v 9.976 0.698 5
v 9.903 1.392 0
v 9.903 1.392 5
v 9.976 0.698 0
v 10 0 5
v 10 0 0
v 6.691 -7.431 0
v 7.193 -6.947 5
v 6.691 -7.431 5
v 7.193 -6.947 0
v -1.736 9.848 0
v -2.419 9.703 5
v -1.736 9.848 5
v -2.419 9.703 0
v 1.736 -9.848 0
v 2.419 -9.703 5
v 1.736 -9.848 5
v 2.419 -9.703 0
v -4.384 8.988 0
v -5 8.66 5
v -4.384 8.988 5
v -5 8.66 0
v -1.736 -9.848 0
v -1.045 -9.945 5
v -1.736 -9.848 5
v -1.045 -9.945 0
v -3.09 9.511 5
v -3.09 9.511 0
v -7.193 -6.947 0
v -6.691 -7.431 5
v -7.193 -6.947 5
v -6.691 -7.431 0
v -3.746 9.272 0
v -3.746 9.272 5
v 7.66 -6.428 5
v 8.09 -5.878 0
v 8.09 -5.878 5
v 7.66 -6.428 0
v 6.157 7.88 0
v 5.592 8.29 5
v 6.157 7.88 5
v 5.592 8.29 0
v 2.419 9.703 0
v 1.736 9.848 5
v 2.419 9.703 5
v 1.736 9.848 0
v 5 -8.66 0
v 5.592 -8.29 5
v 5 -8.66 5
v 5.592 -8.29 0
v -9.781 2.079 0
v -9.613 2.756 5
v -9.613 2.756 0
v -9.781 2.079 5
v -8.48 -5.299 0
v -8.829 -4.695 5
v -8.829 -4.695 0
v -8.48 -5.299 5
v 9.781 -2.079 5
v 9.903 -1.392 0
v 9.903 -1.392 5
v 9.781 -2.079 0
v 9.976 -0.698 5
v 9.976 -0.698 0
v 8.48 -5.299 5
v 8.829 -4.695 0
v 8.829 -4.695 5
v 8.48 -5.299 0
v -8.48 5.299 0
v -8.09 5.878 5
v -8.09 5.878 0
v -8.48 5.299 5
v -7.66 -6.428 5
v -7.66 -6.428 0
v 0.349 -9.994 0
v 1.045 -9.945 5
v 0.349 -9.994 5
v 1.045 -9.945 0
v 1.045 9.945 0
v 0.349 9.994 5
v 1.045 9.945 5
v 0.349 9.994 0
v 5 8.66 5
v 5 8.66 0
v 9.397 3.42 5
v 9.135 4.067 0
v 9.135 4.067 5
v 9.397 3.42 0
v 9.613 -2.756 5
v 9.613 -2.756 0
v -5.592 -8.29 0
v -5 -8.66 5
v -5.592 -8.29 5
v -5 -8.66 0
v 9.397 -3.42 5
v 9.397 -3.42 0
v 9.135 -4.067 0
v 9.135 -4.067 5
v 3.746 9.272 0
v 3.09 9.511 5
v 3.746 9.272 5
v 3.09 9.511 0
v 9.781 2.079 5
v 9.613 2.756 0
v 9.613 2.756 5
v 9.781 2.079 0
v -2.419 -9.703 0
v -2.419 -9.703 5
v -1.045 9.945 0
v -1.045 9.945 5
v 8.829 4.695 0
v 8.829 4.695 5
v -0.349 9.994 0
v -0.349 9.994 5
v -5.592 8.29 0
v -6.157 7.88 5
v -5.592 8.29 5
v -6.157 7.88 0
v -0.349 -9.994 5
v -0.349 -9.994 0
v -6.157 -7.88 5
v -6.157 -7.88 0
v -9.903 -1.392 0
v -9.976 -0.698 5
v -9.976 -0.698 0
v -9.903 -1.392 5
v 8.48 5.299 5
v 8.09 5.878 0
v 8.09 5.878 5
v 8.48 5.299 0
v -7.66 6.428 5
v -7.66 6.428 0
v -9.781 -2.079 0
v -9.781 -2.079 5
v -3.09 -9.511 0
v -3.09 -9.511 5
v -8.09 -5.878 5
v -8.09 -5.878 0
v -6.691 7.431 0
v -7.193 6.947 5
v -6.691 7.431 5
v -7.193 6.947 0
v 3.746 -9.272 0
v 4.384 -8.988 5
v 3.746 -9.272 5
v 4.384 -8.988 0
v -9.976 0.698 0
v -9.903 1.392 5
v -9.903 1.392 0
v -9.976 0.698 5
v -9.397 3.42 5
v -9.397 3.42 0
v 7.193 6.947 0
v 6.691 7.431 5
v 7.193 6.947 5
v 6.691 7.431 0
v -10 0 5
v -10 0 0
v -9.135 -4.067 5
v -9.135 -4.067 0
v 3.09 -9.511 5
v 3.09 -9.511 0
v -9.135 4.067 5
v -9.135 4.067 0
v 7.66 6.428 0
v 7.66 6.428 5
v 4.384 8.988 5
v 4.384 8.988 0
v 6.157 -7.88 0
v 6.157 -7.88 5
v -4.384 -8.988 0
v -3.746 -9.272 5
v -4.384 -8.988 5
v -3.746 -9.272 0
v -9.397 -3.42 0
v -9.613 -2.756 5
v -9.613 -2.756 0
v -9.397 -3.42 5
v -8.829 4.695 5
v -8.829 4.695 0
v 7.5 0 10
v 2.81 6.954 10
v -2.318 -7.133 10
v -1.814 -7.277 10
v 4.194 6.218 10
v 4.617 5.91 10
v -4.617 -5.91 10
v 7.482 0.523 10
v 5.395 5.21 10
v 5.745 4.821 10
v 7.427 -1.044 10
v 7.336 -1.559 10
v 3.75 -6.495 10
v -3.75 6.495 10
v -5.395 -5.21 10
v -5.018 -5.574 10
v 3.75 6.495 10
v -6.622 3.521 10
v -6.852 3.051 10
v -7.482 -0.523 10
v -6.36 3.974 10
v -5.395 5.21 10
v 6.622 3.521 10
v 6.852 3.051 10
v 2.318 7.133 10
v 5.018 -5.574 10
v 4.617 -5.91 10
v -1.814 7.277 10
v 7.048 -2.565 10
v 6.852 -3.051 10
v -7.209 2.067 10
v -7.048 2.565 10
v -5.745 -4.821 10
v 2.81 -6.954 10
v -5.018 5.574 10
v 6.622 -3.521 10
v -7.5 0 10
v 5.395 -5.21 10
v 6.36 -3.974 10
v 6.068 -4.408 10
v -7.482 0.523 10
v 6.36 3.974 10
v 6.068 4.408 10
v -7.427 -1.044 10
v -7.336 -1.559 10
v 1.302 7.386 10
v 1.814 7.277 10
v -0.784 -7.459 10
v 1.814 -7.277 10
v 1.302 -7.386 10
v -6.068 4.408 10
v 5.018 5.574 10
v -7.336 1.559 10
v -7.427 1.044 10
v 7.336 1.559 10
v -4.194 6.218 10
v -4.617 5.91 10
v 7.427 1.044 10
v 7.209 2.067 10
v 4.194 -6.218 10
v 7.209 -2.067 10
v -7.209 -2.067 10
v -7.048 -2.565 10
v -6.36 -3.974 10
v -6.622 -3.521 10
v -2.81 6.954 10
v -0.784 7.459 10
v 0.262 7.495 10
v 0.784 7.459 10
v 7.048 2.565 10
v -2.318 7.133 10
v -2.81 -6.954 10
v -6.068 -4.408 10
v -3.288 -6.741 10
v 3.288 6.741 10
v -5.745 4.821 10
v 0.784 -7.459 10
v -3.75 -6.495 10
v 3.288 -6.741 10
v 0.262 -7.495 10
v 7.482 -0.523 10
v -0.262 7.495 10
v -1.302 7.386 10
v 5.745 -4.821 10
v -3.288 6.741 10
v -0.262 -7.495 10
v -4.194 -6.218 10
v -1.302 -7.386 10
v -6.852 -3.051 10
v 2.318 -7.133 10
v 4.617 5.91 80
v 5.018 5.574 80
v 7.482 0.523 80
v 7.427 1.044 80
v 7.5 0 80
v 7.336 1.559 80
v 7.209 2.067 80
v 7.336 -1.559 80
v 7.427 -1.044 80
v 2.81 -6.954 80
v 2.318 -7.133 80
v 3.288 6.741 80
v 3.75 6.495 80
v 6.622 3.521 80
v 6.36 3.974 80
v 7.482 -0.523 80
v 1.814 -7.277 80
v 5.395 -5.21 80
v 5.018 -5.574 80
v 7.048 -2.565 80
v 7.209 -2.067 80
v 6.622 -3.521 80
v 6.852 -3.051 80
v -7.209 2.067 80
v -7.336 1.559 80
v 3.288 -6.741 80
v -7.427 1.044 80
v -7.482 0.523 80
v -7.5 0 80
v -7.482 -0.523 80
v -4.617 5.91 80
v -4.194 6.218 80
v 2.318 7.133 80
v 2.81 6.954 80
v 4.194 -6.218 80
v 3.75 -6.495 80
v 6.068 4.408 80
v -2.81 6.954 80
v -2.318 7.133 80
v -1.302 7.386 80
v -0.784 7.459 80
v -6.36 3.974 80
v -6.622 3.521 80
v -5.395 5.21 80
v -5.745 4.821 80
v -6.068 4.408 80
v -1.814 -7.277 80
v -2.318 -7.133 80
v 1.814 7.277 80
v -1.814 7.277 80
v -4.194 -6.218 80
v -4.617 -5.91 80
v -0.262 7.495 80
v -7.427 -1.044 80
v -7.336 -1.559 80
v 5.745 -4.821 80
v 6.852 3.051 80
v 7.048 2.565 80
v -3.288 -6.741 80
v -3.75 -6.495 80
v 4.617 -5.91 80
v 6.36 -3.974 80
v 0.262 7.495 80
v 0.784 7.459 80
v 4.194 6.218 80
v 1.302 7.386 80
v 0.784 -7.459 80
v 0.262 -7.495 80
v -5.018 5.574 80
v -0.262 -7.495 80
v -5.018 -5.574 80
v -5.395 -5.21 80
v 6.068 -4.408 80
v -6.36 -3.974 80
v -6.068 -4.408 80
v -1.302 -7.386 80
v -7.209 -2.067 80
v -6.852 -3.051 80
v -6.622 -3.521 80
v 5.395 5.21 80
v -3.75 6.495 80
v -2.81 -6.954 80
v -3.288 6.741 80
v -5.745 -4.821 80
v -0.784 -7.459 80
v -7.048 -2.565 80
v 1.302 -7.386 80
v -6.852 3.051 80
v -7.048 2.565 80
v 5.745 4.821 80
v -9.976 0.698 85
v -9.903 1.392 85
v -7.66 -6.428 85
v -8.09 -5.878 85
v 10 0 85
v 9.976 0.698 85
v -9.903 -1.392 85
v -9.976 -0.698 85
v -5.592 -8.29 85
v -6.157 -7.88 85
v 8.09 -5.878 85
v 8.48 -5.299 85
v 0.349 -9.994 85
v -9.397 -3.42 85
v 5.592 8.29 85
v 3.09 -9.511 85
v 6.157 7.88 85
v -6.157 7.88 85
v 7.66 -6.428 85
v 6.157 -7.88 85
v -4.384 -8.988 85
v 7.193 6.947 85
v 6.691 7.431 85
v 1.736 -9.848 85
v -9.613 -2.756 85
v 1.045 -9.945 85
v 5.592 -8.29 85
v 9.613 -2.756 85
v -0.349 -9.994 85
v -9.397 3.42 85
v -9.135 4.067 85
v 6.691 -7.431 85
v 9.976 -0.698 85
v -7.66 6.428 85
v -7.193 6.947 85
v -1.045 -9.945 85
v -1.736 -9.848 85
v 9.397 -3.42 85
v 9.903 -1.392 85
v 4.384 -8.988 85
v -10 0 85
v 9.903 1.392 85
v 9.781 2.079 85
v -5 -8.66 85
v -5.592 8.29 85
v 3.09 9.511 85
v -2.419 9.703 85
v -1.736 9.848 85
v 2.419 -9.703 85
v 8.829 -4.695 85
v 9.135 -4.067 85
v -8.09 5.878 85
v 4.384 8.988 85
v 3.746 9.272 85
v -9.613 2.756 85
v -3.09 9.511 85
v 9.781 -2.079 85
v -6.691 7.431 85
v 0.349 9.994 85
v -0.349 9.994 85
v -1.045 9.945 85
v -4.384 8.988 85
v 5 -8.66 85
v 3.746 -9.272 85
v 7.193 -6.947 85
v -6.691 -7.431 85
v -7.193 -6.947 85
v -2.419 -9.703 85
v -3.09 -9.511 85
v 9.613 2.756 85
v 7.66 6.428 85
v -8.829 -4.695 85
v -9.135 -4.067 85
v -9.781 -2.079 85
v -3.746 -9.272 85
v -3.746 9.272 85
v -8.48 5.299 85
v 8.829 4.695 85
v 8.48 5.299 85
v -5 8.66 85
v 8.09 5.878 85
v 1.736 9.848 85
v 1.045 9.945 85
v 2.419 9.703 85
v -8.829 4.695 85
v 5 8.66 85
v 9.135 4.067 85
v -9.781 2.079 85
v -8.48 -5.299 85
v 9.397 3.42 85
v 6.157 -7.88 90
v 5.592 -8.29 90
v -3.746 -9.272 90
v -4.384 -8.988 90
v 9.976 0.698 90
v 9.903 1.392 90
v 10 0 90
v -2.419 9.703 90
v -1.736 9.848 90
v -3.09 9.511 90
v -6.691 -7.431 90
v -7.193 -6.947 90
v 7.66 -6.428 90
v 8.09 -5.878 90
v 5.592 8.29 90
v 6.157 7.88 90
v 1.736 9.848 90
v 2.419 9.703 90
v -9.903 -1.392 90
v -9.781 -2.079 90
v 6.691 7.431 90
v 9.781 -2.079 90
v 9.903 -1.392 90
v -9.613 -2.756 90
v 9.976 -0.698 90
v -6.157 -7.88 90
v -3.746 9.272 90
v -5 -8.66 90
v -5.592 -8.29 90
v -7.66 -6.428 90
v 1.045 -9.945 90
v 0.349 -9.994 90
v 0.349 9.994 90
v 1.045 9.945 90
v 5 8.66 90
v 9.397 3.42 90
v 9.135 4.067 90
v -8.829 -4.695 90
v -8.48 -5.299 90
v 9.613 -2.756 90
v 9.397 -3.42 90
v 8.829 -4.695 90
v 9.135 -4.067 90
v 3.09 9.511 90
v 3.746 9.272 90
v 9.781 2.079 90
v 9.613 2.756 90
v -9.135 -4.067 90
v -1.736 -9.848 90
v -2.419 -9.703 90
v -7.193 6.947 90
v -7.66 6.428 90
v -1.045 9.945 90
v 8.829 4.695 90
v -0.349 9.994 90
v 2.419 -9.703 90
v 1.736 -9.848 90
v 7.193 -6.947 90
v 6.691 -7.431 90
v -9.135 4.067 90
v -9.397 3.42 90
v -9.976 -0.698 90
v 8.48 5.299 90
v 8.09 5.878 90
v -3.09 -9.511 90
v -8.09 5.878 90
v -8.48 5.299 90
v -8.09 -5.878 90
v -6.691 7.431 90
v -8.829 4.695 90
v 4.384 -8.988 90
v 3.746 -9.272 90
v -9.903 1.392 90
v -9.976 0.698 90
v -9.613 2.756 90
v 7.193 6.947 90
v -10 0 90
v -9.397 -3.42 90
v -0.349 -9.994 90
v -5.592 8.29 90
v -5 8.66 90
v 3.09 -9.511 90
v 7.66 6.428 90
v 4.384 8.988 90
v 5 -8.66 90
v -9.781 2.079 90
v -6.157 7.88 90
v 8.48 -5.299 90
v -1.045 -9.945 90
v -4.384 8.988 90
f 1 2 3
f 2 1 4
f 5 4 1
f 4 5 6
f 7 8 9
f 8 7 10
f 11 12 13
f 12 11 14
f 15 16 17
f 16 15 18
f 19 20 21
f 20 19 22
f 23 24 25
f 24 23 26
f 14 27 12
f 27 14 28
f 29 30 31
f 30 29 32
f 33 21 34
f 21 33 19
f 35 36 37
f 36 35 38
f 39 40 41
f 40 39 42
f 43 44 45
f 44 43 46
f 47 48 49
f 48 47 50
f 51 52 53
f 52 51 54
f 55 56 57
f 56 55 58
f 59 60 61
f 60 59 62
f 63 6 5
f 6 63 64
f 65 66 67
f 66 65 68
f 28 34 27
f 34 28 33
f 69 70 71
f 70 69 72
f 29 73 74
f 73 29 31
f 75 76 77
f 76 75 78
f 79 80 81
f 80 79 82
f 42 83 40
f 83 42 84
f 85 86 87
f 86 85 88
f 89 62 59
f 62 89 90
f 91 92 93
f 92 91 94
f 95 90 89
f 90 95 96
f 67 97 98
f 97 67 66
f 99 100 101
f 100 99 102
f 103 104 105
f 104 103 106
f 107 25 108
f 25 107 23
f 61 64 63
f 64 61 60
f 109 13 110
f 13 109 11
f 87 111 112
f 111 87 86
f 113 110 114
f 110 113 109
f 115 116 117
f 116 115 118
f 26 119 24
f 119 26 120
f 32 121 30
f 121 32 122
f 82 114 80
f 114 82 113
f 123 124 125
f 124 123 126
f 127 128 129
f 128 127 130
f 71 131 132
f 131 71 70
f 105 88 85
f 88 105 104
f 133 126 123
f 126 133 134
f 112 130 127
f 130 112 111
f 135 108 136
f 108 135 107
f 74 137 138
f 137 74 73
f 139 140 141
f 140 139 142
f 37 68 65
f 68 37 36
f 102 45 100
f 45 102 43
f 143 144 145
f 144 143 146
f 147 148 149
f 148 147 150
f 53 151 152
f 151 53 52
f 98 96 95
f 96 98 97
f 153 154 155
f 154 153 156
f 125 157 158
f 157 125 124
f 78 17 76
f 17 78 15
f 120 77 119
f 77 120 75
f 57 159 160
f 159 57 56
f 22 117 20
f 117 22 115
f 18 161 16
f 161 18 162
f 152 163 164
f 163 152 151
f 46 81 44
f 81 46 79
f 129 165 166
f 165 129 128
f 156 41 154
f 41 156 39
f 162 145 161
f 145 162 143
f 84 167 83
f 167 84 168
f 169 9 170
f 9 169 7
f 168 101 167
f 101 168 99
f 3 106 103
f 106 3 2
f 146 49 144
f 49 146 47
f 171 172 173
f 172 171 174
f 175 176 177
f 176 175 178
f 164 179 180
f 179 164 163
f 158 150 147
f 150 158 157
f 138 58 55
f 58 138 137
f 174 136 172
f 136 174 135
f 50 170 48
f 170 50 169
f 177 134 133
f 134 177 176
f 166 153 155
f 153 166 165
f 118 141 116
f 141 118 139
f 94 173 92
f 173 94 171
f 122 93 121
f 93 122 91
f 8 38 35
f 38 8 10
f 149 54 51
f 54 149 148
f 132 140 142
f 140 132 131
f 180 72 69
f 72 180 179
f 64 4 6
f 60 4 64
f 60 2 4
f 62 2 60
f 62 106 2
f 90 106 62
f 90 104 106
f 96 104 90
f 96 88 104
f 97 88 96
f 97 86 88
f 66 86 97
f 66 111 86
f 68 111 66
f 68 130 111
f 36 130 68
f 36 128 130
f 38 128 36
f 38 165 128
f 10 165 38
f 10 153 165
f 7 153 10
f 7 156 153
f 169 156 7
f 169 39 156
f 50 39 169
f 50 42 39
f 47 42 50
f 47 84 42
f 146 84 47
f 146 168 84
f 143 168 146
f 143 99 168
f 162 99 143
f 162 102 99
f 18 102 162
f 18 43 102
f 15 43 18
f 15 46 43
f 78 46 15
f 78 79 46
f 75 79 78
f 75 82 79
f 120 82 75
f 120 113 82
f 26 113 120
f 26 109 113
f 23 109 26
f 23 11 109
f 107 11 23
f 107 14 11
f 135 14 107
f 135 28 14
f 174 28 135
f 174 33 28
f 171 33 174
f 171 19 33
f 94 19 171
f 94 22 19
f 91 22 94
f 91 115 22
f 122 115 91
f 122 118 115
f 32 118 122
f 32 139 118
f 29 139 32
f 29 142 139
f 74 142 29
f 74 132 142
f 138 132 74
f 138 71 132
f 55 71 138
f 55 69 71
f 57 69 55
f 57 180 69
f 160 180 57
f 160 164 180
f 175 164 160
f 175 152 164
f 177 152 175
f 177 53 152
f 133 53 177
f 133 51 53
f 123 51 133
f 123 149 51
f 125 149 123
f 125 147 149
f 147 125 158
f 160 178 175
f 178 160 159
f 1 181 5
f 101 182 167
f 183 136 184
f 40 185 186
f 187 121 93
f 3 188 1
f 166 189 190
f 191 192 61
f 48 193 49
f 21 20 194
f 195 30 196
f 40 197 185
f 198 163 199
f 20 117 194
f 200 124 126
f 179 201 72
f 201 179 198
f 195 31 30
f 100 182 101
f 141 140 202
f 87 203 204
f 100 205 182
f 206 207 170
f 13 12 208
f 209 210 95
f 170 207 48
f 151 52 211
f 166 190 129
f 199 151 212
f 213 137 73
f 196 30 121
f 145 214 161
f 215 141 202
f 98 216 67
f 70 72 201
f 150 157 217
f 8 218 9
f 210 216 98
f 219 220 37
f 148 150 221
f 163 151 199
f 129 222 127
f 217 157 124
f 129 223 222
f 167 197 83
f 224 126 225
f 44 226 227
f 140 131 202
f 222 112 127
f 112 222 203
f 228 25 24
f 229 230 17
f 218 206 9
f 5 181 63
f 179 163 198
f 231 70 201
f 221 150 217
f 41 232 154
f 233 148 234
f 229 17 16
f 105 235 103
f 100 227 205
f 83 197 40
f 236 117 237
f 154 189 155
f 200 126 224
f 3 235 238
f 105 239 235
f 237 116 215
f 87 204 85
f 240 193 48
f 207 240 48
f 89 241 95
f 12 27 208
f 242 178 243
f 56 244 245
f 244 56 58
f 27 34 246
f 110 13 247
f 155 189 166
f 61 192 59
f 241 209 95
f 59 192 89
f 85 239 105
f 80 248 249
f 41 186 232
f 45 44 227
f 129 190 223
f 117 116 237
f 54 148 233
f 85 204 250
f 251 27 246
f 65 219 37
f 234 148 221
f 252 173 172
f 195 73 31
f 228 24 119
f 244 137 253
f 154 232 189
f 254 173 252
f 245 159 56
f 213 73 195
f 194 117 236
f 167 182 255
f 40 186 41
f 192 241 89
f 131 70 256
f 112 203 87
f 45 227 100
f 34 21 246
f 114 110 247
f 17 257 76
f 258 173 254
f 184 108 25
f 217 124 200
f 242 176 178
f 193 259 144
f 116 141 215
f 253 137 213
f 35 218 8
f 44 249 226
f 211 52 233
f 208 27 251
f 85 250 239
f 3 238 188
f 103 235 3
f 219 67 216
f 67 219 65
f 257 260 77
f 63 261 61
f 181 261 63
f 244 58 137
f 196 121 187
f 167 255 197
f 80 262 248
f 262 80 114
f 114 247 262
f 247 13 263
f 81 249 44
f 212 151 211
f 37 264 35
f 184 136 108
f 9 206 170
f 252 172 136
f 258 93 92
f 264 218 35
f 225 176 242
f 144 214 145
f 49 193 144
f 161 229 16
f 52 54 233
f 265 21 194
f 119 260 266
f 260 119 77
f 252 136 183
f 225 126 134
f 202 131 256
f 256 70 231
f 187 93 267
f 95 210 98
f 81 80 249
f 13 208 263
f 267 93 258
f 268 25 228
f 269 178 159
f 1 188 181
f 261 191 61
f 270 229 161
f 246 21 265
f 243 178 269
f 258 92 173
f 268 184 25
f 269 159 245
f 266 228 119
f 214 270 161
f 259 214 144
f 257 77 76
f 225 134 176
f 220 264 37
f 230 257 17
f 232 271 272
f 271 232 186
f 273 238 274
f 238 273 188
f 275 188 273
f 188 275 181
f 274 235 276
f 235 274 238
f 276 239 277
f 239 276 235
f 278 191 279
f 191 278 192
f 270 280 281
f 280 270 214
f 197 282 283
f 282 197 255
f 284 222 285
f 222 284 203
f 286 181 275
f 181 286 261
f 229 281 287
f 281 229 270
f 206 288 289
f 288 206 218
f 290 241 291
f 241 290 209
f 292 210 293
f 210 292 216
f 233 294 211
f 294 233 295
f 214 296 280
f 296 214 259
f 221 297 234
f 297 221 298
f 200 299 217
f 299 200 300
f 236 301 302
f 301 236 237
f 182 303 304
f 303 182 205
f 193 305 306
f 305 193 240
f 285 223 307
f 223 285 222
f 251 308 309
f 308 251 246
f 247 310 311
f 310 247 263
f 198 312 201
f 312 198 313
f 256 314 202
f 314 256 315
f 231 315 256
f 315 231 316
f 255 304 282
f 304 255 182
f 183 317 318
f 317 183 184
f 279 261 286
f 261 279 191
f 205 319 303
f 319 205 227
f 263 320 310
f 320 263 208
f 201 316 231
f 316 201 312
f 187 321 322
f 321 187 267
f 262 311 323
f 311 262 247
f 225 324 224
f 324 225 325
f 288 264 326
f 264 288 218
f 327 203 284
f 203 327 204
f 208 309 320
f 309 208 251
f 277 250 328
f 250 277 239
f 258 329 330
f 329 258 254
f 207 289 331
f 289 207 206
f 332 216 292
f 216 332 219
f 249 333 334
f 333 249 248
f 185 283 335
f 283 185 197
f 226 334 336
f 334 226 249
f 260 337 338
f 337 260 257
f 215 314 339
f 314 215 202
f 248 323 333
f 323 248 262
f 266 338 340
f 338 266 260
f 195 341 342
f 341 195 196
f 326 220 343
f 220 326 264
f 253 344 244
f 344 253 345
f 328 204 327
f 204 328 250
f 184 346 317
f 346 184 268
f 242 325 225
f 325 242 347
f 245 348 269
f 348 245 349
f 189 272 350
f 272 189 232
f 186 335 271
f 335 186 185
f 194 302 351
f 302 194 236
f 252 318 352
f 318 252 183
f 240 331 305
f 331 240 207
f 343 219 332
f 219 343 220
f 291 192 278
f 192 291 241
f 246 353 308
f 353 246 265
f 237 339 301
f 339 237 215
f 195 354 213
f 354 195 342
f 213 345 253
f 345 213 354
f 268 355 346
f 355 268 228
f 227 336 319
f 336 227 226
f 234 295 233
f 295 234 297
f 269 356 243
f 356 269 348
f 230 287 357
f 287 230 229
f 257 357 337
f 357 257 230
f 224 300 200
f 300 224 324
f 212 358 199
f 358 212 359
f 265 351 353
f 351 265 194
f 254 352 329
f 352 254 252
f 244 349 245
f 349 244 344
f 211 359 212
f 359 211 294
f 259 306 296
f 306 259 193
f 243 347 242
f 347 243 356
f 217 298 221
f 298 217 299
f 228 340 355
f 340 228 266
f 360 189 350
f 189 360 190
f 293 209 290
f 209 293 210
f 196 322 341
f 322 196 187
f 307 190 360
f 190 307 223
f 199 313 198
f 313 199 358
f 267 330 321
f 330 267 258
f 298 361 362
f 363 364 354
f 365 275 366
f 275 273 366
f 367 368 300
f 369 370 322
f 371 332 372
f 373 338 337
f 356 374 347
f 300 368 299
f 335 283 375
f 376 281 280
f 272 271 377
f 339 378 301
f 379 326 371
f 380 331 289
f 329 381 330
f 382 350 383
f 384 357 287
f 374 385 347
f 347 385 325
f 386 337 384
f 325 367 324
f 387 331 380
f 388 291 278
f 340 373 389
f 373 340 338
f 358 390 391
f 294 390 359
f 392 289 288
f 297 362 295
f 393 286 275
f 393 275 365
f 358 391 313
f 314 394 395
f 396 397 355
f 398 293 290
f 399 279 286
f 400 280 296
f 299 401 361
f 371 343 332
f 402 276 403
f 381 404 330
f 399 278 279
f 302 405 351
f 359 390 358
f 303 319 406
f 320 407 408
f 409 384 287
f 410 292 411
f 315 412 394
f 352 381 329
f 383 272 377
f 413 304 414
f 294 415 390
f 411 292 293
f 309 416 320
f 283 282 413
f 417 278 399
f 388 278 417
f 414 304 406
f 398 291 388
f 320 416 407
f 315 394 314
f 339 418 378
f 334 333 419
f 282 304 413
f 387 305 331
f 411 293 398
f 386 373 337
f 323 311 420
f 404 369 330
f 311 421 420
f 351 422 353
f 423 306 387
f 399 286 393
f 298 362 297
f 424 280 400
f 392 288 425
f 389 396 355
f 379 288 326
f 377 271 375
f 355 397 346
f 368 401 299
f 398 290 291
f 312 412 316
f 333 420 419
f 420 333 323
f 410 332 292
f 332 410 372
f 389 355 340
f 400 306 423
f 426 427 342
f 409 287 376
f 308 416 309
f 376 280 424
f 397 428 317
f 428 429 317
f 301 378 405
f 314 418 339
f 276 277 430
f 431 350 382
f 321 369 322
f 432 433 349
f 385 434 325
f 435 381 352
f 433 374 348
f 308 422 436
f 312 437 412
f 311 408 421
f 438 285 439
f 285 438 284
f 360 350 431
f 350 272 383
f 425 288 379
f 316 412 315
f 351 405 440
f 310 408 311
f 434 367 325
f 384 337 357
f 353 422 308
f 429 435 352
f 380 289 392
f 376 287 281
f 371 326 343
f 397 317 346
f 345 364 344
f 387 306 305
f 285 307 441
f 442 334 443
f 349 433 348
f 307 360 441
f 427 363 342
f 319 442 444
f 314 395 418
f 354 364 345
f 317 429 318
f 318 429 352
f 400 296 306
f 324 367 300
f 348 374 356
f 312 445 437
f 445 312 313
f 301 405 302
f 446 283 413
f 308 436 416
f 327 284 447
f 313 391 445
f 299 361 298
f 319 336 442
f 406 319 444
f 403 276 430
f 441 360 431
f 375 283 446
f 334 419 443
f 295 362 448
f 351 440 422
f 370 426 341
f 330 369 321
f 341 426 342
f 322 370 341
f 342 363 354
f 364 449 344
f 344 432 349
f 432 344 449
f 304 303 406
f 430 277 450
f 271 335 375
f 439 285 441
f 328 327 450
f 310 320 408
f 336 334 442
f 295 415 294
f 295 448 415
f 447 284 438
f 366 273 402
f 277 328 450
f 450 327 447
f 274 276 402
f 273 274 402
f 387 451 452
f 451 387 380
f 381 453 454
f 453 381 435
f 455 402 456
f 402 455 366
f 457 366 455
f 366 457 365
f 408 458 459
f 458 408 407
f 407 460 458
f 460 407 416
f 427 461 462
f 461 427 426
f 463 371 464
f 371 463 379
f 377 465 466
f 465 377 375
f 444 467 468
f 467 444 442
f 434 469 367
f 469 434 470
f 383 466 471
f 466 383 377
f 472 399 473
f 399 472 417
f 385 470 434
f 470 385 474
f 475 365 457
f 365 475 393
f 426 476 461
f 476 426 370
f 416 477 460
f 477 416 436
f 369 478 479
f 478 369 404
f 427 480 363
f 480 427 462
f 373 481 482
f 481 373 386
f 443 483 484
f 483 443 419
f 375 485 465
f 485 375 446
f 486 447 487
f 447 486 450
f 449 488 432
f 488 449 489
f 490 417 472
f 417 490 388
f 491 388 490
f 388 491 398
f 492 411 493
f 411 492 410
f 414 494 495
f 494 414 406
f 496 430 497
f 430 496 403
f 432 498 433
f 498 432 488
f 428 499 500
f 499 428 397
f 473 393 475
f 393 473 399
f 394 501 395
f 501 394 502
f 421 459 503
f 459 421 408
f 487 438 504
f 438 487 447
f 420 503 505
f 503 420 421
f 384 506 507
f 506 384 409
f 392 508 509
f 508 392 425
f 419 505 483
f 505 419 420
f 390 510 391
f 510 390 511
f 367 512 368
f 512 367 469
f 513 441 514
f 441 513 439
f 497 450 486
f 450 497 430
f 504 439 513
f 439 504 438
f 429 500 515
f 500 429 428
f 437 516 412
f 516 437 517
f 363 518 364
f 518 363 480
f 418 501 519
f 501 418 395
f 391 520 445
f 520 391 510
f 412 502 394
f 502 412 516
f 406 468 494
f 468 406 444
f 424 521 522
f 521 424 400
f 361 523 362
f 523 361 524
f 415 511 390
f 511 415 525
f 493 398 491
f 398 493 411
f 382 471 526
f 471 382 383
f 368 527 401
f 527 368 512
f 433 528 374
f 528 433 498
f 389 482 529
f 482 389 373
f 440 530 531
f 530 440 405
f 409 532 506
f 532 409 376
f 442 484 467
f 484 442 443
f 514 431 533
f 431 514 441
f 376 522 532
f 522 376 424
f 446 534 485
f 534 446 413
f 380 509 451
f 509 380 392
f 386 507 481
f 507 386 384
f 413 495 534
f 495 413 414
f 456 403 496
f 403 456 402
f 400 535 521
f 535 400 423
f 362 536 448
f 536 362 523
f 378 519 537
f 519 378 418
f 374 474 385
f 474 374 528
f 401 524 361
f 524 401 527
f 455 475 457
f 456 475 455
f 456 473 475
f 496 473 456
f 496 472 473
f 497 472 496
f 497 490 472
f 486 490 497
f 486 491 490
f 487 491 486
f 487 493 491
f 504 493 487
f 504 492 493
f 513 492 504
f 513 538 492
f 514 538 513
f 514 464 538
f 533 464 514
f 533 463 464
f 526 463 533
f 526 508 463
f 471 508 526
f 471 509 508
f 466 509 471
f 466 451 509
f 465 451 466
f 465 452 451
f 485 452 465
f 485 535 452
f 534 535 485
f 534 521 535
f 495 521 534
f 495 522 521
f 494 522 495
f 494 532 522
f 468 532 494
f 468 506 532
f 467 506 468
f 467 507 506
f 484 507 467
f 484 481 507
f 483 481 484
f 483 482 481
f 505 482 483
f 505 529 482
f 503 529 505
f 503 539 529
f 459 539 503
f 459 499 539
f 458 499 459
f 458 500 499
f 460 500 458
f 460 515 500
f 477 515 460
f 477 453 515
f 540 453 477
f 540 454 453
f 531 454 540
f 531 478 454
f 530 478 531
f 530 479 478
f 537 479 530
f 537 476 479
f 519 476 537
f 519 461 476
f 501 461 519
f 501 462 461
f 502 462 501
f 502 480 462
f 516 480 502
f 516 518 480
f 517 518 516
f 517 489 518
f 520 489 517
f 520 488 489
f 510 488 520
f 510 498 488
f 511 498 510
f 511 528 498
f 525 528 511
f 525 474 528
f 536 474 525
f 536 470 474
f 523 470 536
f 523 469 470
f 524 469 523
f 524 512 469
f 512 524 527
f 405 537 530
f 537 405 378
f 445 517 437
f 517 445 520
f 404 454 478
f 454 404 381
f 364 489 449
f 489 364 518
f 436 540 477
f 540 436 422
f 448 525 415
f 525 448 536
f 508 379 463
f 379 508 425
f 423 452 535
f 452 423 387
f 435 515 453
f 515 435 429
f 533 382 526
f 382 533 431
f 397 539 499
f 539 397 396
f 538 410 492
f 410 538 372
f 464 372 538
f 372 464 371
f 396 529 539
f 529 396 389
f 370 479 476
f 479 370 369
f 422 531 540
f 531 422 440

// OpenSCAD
// general parameters
eps = 0.01;
$fn = 90;

// contact area height
c_h = 70;
// contact area diameter
c_d = 15;

// enders height
e_h = 5;
// enders diameters 
e_d = 20;

// transition height
t_h = (e_d-c_d);


module hand_handle()
{
    // lower end
    cylinder(d=e_d, h=e_h);
    // lower transition
    translate([0,0,e_h])
        cylinder(d1=e_d, d2=c_d, h=t_h);
    // main area
    translate([0,0,e_h+t_h])
        cylinder(d=c_d,h=c_h);
    // upper transition
    translate([0,0,e_h+t_h+c_h])
        cylinder(d1=c_d, d2=e_d, h=t_h);
    // upper end
    translate([0,0,e_h+t_h+c_h+t_h])
        cylinder(d=e_d, h=e_h);
}

hand_handle();
